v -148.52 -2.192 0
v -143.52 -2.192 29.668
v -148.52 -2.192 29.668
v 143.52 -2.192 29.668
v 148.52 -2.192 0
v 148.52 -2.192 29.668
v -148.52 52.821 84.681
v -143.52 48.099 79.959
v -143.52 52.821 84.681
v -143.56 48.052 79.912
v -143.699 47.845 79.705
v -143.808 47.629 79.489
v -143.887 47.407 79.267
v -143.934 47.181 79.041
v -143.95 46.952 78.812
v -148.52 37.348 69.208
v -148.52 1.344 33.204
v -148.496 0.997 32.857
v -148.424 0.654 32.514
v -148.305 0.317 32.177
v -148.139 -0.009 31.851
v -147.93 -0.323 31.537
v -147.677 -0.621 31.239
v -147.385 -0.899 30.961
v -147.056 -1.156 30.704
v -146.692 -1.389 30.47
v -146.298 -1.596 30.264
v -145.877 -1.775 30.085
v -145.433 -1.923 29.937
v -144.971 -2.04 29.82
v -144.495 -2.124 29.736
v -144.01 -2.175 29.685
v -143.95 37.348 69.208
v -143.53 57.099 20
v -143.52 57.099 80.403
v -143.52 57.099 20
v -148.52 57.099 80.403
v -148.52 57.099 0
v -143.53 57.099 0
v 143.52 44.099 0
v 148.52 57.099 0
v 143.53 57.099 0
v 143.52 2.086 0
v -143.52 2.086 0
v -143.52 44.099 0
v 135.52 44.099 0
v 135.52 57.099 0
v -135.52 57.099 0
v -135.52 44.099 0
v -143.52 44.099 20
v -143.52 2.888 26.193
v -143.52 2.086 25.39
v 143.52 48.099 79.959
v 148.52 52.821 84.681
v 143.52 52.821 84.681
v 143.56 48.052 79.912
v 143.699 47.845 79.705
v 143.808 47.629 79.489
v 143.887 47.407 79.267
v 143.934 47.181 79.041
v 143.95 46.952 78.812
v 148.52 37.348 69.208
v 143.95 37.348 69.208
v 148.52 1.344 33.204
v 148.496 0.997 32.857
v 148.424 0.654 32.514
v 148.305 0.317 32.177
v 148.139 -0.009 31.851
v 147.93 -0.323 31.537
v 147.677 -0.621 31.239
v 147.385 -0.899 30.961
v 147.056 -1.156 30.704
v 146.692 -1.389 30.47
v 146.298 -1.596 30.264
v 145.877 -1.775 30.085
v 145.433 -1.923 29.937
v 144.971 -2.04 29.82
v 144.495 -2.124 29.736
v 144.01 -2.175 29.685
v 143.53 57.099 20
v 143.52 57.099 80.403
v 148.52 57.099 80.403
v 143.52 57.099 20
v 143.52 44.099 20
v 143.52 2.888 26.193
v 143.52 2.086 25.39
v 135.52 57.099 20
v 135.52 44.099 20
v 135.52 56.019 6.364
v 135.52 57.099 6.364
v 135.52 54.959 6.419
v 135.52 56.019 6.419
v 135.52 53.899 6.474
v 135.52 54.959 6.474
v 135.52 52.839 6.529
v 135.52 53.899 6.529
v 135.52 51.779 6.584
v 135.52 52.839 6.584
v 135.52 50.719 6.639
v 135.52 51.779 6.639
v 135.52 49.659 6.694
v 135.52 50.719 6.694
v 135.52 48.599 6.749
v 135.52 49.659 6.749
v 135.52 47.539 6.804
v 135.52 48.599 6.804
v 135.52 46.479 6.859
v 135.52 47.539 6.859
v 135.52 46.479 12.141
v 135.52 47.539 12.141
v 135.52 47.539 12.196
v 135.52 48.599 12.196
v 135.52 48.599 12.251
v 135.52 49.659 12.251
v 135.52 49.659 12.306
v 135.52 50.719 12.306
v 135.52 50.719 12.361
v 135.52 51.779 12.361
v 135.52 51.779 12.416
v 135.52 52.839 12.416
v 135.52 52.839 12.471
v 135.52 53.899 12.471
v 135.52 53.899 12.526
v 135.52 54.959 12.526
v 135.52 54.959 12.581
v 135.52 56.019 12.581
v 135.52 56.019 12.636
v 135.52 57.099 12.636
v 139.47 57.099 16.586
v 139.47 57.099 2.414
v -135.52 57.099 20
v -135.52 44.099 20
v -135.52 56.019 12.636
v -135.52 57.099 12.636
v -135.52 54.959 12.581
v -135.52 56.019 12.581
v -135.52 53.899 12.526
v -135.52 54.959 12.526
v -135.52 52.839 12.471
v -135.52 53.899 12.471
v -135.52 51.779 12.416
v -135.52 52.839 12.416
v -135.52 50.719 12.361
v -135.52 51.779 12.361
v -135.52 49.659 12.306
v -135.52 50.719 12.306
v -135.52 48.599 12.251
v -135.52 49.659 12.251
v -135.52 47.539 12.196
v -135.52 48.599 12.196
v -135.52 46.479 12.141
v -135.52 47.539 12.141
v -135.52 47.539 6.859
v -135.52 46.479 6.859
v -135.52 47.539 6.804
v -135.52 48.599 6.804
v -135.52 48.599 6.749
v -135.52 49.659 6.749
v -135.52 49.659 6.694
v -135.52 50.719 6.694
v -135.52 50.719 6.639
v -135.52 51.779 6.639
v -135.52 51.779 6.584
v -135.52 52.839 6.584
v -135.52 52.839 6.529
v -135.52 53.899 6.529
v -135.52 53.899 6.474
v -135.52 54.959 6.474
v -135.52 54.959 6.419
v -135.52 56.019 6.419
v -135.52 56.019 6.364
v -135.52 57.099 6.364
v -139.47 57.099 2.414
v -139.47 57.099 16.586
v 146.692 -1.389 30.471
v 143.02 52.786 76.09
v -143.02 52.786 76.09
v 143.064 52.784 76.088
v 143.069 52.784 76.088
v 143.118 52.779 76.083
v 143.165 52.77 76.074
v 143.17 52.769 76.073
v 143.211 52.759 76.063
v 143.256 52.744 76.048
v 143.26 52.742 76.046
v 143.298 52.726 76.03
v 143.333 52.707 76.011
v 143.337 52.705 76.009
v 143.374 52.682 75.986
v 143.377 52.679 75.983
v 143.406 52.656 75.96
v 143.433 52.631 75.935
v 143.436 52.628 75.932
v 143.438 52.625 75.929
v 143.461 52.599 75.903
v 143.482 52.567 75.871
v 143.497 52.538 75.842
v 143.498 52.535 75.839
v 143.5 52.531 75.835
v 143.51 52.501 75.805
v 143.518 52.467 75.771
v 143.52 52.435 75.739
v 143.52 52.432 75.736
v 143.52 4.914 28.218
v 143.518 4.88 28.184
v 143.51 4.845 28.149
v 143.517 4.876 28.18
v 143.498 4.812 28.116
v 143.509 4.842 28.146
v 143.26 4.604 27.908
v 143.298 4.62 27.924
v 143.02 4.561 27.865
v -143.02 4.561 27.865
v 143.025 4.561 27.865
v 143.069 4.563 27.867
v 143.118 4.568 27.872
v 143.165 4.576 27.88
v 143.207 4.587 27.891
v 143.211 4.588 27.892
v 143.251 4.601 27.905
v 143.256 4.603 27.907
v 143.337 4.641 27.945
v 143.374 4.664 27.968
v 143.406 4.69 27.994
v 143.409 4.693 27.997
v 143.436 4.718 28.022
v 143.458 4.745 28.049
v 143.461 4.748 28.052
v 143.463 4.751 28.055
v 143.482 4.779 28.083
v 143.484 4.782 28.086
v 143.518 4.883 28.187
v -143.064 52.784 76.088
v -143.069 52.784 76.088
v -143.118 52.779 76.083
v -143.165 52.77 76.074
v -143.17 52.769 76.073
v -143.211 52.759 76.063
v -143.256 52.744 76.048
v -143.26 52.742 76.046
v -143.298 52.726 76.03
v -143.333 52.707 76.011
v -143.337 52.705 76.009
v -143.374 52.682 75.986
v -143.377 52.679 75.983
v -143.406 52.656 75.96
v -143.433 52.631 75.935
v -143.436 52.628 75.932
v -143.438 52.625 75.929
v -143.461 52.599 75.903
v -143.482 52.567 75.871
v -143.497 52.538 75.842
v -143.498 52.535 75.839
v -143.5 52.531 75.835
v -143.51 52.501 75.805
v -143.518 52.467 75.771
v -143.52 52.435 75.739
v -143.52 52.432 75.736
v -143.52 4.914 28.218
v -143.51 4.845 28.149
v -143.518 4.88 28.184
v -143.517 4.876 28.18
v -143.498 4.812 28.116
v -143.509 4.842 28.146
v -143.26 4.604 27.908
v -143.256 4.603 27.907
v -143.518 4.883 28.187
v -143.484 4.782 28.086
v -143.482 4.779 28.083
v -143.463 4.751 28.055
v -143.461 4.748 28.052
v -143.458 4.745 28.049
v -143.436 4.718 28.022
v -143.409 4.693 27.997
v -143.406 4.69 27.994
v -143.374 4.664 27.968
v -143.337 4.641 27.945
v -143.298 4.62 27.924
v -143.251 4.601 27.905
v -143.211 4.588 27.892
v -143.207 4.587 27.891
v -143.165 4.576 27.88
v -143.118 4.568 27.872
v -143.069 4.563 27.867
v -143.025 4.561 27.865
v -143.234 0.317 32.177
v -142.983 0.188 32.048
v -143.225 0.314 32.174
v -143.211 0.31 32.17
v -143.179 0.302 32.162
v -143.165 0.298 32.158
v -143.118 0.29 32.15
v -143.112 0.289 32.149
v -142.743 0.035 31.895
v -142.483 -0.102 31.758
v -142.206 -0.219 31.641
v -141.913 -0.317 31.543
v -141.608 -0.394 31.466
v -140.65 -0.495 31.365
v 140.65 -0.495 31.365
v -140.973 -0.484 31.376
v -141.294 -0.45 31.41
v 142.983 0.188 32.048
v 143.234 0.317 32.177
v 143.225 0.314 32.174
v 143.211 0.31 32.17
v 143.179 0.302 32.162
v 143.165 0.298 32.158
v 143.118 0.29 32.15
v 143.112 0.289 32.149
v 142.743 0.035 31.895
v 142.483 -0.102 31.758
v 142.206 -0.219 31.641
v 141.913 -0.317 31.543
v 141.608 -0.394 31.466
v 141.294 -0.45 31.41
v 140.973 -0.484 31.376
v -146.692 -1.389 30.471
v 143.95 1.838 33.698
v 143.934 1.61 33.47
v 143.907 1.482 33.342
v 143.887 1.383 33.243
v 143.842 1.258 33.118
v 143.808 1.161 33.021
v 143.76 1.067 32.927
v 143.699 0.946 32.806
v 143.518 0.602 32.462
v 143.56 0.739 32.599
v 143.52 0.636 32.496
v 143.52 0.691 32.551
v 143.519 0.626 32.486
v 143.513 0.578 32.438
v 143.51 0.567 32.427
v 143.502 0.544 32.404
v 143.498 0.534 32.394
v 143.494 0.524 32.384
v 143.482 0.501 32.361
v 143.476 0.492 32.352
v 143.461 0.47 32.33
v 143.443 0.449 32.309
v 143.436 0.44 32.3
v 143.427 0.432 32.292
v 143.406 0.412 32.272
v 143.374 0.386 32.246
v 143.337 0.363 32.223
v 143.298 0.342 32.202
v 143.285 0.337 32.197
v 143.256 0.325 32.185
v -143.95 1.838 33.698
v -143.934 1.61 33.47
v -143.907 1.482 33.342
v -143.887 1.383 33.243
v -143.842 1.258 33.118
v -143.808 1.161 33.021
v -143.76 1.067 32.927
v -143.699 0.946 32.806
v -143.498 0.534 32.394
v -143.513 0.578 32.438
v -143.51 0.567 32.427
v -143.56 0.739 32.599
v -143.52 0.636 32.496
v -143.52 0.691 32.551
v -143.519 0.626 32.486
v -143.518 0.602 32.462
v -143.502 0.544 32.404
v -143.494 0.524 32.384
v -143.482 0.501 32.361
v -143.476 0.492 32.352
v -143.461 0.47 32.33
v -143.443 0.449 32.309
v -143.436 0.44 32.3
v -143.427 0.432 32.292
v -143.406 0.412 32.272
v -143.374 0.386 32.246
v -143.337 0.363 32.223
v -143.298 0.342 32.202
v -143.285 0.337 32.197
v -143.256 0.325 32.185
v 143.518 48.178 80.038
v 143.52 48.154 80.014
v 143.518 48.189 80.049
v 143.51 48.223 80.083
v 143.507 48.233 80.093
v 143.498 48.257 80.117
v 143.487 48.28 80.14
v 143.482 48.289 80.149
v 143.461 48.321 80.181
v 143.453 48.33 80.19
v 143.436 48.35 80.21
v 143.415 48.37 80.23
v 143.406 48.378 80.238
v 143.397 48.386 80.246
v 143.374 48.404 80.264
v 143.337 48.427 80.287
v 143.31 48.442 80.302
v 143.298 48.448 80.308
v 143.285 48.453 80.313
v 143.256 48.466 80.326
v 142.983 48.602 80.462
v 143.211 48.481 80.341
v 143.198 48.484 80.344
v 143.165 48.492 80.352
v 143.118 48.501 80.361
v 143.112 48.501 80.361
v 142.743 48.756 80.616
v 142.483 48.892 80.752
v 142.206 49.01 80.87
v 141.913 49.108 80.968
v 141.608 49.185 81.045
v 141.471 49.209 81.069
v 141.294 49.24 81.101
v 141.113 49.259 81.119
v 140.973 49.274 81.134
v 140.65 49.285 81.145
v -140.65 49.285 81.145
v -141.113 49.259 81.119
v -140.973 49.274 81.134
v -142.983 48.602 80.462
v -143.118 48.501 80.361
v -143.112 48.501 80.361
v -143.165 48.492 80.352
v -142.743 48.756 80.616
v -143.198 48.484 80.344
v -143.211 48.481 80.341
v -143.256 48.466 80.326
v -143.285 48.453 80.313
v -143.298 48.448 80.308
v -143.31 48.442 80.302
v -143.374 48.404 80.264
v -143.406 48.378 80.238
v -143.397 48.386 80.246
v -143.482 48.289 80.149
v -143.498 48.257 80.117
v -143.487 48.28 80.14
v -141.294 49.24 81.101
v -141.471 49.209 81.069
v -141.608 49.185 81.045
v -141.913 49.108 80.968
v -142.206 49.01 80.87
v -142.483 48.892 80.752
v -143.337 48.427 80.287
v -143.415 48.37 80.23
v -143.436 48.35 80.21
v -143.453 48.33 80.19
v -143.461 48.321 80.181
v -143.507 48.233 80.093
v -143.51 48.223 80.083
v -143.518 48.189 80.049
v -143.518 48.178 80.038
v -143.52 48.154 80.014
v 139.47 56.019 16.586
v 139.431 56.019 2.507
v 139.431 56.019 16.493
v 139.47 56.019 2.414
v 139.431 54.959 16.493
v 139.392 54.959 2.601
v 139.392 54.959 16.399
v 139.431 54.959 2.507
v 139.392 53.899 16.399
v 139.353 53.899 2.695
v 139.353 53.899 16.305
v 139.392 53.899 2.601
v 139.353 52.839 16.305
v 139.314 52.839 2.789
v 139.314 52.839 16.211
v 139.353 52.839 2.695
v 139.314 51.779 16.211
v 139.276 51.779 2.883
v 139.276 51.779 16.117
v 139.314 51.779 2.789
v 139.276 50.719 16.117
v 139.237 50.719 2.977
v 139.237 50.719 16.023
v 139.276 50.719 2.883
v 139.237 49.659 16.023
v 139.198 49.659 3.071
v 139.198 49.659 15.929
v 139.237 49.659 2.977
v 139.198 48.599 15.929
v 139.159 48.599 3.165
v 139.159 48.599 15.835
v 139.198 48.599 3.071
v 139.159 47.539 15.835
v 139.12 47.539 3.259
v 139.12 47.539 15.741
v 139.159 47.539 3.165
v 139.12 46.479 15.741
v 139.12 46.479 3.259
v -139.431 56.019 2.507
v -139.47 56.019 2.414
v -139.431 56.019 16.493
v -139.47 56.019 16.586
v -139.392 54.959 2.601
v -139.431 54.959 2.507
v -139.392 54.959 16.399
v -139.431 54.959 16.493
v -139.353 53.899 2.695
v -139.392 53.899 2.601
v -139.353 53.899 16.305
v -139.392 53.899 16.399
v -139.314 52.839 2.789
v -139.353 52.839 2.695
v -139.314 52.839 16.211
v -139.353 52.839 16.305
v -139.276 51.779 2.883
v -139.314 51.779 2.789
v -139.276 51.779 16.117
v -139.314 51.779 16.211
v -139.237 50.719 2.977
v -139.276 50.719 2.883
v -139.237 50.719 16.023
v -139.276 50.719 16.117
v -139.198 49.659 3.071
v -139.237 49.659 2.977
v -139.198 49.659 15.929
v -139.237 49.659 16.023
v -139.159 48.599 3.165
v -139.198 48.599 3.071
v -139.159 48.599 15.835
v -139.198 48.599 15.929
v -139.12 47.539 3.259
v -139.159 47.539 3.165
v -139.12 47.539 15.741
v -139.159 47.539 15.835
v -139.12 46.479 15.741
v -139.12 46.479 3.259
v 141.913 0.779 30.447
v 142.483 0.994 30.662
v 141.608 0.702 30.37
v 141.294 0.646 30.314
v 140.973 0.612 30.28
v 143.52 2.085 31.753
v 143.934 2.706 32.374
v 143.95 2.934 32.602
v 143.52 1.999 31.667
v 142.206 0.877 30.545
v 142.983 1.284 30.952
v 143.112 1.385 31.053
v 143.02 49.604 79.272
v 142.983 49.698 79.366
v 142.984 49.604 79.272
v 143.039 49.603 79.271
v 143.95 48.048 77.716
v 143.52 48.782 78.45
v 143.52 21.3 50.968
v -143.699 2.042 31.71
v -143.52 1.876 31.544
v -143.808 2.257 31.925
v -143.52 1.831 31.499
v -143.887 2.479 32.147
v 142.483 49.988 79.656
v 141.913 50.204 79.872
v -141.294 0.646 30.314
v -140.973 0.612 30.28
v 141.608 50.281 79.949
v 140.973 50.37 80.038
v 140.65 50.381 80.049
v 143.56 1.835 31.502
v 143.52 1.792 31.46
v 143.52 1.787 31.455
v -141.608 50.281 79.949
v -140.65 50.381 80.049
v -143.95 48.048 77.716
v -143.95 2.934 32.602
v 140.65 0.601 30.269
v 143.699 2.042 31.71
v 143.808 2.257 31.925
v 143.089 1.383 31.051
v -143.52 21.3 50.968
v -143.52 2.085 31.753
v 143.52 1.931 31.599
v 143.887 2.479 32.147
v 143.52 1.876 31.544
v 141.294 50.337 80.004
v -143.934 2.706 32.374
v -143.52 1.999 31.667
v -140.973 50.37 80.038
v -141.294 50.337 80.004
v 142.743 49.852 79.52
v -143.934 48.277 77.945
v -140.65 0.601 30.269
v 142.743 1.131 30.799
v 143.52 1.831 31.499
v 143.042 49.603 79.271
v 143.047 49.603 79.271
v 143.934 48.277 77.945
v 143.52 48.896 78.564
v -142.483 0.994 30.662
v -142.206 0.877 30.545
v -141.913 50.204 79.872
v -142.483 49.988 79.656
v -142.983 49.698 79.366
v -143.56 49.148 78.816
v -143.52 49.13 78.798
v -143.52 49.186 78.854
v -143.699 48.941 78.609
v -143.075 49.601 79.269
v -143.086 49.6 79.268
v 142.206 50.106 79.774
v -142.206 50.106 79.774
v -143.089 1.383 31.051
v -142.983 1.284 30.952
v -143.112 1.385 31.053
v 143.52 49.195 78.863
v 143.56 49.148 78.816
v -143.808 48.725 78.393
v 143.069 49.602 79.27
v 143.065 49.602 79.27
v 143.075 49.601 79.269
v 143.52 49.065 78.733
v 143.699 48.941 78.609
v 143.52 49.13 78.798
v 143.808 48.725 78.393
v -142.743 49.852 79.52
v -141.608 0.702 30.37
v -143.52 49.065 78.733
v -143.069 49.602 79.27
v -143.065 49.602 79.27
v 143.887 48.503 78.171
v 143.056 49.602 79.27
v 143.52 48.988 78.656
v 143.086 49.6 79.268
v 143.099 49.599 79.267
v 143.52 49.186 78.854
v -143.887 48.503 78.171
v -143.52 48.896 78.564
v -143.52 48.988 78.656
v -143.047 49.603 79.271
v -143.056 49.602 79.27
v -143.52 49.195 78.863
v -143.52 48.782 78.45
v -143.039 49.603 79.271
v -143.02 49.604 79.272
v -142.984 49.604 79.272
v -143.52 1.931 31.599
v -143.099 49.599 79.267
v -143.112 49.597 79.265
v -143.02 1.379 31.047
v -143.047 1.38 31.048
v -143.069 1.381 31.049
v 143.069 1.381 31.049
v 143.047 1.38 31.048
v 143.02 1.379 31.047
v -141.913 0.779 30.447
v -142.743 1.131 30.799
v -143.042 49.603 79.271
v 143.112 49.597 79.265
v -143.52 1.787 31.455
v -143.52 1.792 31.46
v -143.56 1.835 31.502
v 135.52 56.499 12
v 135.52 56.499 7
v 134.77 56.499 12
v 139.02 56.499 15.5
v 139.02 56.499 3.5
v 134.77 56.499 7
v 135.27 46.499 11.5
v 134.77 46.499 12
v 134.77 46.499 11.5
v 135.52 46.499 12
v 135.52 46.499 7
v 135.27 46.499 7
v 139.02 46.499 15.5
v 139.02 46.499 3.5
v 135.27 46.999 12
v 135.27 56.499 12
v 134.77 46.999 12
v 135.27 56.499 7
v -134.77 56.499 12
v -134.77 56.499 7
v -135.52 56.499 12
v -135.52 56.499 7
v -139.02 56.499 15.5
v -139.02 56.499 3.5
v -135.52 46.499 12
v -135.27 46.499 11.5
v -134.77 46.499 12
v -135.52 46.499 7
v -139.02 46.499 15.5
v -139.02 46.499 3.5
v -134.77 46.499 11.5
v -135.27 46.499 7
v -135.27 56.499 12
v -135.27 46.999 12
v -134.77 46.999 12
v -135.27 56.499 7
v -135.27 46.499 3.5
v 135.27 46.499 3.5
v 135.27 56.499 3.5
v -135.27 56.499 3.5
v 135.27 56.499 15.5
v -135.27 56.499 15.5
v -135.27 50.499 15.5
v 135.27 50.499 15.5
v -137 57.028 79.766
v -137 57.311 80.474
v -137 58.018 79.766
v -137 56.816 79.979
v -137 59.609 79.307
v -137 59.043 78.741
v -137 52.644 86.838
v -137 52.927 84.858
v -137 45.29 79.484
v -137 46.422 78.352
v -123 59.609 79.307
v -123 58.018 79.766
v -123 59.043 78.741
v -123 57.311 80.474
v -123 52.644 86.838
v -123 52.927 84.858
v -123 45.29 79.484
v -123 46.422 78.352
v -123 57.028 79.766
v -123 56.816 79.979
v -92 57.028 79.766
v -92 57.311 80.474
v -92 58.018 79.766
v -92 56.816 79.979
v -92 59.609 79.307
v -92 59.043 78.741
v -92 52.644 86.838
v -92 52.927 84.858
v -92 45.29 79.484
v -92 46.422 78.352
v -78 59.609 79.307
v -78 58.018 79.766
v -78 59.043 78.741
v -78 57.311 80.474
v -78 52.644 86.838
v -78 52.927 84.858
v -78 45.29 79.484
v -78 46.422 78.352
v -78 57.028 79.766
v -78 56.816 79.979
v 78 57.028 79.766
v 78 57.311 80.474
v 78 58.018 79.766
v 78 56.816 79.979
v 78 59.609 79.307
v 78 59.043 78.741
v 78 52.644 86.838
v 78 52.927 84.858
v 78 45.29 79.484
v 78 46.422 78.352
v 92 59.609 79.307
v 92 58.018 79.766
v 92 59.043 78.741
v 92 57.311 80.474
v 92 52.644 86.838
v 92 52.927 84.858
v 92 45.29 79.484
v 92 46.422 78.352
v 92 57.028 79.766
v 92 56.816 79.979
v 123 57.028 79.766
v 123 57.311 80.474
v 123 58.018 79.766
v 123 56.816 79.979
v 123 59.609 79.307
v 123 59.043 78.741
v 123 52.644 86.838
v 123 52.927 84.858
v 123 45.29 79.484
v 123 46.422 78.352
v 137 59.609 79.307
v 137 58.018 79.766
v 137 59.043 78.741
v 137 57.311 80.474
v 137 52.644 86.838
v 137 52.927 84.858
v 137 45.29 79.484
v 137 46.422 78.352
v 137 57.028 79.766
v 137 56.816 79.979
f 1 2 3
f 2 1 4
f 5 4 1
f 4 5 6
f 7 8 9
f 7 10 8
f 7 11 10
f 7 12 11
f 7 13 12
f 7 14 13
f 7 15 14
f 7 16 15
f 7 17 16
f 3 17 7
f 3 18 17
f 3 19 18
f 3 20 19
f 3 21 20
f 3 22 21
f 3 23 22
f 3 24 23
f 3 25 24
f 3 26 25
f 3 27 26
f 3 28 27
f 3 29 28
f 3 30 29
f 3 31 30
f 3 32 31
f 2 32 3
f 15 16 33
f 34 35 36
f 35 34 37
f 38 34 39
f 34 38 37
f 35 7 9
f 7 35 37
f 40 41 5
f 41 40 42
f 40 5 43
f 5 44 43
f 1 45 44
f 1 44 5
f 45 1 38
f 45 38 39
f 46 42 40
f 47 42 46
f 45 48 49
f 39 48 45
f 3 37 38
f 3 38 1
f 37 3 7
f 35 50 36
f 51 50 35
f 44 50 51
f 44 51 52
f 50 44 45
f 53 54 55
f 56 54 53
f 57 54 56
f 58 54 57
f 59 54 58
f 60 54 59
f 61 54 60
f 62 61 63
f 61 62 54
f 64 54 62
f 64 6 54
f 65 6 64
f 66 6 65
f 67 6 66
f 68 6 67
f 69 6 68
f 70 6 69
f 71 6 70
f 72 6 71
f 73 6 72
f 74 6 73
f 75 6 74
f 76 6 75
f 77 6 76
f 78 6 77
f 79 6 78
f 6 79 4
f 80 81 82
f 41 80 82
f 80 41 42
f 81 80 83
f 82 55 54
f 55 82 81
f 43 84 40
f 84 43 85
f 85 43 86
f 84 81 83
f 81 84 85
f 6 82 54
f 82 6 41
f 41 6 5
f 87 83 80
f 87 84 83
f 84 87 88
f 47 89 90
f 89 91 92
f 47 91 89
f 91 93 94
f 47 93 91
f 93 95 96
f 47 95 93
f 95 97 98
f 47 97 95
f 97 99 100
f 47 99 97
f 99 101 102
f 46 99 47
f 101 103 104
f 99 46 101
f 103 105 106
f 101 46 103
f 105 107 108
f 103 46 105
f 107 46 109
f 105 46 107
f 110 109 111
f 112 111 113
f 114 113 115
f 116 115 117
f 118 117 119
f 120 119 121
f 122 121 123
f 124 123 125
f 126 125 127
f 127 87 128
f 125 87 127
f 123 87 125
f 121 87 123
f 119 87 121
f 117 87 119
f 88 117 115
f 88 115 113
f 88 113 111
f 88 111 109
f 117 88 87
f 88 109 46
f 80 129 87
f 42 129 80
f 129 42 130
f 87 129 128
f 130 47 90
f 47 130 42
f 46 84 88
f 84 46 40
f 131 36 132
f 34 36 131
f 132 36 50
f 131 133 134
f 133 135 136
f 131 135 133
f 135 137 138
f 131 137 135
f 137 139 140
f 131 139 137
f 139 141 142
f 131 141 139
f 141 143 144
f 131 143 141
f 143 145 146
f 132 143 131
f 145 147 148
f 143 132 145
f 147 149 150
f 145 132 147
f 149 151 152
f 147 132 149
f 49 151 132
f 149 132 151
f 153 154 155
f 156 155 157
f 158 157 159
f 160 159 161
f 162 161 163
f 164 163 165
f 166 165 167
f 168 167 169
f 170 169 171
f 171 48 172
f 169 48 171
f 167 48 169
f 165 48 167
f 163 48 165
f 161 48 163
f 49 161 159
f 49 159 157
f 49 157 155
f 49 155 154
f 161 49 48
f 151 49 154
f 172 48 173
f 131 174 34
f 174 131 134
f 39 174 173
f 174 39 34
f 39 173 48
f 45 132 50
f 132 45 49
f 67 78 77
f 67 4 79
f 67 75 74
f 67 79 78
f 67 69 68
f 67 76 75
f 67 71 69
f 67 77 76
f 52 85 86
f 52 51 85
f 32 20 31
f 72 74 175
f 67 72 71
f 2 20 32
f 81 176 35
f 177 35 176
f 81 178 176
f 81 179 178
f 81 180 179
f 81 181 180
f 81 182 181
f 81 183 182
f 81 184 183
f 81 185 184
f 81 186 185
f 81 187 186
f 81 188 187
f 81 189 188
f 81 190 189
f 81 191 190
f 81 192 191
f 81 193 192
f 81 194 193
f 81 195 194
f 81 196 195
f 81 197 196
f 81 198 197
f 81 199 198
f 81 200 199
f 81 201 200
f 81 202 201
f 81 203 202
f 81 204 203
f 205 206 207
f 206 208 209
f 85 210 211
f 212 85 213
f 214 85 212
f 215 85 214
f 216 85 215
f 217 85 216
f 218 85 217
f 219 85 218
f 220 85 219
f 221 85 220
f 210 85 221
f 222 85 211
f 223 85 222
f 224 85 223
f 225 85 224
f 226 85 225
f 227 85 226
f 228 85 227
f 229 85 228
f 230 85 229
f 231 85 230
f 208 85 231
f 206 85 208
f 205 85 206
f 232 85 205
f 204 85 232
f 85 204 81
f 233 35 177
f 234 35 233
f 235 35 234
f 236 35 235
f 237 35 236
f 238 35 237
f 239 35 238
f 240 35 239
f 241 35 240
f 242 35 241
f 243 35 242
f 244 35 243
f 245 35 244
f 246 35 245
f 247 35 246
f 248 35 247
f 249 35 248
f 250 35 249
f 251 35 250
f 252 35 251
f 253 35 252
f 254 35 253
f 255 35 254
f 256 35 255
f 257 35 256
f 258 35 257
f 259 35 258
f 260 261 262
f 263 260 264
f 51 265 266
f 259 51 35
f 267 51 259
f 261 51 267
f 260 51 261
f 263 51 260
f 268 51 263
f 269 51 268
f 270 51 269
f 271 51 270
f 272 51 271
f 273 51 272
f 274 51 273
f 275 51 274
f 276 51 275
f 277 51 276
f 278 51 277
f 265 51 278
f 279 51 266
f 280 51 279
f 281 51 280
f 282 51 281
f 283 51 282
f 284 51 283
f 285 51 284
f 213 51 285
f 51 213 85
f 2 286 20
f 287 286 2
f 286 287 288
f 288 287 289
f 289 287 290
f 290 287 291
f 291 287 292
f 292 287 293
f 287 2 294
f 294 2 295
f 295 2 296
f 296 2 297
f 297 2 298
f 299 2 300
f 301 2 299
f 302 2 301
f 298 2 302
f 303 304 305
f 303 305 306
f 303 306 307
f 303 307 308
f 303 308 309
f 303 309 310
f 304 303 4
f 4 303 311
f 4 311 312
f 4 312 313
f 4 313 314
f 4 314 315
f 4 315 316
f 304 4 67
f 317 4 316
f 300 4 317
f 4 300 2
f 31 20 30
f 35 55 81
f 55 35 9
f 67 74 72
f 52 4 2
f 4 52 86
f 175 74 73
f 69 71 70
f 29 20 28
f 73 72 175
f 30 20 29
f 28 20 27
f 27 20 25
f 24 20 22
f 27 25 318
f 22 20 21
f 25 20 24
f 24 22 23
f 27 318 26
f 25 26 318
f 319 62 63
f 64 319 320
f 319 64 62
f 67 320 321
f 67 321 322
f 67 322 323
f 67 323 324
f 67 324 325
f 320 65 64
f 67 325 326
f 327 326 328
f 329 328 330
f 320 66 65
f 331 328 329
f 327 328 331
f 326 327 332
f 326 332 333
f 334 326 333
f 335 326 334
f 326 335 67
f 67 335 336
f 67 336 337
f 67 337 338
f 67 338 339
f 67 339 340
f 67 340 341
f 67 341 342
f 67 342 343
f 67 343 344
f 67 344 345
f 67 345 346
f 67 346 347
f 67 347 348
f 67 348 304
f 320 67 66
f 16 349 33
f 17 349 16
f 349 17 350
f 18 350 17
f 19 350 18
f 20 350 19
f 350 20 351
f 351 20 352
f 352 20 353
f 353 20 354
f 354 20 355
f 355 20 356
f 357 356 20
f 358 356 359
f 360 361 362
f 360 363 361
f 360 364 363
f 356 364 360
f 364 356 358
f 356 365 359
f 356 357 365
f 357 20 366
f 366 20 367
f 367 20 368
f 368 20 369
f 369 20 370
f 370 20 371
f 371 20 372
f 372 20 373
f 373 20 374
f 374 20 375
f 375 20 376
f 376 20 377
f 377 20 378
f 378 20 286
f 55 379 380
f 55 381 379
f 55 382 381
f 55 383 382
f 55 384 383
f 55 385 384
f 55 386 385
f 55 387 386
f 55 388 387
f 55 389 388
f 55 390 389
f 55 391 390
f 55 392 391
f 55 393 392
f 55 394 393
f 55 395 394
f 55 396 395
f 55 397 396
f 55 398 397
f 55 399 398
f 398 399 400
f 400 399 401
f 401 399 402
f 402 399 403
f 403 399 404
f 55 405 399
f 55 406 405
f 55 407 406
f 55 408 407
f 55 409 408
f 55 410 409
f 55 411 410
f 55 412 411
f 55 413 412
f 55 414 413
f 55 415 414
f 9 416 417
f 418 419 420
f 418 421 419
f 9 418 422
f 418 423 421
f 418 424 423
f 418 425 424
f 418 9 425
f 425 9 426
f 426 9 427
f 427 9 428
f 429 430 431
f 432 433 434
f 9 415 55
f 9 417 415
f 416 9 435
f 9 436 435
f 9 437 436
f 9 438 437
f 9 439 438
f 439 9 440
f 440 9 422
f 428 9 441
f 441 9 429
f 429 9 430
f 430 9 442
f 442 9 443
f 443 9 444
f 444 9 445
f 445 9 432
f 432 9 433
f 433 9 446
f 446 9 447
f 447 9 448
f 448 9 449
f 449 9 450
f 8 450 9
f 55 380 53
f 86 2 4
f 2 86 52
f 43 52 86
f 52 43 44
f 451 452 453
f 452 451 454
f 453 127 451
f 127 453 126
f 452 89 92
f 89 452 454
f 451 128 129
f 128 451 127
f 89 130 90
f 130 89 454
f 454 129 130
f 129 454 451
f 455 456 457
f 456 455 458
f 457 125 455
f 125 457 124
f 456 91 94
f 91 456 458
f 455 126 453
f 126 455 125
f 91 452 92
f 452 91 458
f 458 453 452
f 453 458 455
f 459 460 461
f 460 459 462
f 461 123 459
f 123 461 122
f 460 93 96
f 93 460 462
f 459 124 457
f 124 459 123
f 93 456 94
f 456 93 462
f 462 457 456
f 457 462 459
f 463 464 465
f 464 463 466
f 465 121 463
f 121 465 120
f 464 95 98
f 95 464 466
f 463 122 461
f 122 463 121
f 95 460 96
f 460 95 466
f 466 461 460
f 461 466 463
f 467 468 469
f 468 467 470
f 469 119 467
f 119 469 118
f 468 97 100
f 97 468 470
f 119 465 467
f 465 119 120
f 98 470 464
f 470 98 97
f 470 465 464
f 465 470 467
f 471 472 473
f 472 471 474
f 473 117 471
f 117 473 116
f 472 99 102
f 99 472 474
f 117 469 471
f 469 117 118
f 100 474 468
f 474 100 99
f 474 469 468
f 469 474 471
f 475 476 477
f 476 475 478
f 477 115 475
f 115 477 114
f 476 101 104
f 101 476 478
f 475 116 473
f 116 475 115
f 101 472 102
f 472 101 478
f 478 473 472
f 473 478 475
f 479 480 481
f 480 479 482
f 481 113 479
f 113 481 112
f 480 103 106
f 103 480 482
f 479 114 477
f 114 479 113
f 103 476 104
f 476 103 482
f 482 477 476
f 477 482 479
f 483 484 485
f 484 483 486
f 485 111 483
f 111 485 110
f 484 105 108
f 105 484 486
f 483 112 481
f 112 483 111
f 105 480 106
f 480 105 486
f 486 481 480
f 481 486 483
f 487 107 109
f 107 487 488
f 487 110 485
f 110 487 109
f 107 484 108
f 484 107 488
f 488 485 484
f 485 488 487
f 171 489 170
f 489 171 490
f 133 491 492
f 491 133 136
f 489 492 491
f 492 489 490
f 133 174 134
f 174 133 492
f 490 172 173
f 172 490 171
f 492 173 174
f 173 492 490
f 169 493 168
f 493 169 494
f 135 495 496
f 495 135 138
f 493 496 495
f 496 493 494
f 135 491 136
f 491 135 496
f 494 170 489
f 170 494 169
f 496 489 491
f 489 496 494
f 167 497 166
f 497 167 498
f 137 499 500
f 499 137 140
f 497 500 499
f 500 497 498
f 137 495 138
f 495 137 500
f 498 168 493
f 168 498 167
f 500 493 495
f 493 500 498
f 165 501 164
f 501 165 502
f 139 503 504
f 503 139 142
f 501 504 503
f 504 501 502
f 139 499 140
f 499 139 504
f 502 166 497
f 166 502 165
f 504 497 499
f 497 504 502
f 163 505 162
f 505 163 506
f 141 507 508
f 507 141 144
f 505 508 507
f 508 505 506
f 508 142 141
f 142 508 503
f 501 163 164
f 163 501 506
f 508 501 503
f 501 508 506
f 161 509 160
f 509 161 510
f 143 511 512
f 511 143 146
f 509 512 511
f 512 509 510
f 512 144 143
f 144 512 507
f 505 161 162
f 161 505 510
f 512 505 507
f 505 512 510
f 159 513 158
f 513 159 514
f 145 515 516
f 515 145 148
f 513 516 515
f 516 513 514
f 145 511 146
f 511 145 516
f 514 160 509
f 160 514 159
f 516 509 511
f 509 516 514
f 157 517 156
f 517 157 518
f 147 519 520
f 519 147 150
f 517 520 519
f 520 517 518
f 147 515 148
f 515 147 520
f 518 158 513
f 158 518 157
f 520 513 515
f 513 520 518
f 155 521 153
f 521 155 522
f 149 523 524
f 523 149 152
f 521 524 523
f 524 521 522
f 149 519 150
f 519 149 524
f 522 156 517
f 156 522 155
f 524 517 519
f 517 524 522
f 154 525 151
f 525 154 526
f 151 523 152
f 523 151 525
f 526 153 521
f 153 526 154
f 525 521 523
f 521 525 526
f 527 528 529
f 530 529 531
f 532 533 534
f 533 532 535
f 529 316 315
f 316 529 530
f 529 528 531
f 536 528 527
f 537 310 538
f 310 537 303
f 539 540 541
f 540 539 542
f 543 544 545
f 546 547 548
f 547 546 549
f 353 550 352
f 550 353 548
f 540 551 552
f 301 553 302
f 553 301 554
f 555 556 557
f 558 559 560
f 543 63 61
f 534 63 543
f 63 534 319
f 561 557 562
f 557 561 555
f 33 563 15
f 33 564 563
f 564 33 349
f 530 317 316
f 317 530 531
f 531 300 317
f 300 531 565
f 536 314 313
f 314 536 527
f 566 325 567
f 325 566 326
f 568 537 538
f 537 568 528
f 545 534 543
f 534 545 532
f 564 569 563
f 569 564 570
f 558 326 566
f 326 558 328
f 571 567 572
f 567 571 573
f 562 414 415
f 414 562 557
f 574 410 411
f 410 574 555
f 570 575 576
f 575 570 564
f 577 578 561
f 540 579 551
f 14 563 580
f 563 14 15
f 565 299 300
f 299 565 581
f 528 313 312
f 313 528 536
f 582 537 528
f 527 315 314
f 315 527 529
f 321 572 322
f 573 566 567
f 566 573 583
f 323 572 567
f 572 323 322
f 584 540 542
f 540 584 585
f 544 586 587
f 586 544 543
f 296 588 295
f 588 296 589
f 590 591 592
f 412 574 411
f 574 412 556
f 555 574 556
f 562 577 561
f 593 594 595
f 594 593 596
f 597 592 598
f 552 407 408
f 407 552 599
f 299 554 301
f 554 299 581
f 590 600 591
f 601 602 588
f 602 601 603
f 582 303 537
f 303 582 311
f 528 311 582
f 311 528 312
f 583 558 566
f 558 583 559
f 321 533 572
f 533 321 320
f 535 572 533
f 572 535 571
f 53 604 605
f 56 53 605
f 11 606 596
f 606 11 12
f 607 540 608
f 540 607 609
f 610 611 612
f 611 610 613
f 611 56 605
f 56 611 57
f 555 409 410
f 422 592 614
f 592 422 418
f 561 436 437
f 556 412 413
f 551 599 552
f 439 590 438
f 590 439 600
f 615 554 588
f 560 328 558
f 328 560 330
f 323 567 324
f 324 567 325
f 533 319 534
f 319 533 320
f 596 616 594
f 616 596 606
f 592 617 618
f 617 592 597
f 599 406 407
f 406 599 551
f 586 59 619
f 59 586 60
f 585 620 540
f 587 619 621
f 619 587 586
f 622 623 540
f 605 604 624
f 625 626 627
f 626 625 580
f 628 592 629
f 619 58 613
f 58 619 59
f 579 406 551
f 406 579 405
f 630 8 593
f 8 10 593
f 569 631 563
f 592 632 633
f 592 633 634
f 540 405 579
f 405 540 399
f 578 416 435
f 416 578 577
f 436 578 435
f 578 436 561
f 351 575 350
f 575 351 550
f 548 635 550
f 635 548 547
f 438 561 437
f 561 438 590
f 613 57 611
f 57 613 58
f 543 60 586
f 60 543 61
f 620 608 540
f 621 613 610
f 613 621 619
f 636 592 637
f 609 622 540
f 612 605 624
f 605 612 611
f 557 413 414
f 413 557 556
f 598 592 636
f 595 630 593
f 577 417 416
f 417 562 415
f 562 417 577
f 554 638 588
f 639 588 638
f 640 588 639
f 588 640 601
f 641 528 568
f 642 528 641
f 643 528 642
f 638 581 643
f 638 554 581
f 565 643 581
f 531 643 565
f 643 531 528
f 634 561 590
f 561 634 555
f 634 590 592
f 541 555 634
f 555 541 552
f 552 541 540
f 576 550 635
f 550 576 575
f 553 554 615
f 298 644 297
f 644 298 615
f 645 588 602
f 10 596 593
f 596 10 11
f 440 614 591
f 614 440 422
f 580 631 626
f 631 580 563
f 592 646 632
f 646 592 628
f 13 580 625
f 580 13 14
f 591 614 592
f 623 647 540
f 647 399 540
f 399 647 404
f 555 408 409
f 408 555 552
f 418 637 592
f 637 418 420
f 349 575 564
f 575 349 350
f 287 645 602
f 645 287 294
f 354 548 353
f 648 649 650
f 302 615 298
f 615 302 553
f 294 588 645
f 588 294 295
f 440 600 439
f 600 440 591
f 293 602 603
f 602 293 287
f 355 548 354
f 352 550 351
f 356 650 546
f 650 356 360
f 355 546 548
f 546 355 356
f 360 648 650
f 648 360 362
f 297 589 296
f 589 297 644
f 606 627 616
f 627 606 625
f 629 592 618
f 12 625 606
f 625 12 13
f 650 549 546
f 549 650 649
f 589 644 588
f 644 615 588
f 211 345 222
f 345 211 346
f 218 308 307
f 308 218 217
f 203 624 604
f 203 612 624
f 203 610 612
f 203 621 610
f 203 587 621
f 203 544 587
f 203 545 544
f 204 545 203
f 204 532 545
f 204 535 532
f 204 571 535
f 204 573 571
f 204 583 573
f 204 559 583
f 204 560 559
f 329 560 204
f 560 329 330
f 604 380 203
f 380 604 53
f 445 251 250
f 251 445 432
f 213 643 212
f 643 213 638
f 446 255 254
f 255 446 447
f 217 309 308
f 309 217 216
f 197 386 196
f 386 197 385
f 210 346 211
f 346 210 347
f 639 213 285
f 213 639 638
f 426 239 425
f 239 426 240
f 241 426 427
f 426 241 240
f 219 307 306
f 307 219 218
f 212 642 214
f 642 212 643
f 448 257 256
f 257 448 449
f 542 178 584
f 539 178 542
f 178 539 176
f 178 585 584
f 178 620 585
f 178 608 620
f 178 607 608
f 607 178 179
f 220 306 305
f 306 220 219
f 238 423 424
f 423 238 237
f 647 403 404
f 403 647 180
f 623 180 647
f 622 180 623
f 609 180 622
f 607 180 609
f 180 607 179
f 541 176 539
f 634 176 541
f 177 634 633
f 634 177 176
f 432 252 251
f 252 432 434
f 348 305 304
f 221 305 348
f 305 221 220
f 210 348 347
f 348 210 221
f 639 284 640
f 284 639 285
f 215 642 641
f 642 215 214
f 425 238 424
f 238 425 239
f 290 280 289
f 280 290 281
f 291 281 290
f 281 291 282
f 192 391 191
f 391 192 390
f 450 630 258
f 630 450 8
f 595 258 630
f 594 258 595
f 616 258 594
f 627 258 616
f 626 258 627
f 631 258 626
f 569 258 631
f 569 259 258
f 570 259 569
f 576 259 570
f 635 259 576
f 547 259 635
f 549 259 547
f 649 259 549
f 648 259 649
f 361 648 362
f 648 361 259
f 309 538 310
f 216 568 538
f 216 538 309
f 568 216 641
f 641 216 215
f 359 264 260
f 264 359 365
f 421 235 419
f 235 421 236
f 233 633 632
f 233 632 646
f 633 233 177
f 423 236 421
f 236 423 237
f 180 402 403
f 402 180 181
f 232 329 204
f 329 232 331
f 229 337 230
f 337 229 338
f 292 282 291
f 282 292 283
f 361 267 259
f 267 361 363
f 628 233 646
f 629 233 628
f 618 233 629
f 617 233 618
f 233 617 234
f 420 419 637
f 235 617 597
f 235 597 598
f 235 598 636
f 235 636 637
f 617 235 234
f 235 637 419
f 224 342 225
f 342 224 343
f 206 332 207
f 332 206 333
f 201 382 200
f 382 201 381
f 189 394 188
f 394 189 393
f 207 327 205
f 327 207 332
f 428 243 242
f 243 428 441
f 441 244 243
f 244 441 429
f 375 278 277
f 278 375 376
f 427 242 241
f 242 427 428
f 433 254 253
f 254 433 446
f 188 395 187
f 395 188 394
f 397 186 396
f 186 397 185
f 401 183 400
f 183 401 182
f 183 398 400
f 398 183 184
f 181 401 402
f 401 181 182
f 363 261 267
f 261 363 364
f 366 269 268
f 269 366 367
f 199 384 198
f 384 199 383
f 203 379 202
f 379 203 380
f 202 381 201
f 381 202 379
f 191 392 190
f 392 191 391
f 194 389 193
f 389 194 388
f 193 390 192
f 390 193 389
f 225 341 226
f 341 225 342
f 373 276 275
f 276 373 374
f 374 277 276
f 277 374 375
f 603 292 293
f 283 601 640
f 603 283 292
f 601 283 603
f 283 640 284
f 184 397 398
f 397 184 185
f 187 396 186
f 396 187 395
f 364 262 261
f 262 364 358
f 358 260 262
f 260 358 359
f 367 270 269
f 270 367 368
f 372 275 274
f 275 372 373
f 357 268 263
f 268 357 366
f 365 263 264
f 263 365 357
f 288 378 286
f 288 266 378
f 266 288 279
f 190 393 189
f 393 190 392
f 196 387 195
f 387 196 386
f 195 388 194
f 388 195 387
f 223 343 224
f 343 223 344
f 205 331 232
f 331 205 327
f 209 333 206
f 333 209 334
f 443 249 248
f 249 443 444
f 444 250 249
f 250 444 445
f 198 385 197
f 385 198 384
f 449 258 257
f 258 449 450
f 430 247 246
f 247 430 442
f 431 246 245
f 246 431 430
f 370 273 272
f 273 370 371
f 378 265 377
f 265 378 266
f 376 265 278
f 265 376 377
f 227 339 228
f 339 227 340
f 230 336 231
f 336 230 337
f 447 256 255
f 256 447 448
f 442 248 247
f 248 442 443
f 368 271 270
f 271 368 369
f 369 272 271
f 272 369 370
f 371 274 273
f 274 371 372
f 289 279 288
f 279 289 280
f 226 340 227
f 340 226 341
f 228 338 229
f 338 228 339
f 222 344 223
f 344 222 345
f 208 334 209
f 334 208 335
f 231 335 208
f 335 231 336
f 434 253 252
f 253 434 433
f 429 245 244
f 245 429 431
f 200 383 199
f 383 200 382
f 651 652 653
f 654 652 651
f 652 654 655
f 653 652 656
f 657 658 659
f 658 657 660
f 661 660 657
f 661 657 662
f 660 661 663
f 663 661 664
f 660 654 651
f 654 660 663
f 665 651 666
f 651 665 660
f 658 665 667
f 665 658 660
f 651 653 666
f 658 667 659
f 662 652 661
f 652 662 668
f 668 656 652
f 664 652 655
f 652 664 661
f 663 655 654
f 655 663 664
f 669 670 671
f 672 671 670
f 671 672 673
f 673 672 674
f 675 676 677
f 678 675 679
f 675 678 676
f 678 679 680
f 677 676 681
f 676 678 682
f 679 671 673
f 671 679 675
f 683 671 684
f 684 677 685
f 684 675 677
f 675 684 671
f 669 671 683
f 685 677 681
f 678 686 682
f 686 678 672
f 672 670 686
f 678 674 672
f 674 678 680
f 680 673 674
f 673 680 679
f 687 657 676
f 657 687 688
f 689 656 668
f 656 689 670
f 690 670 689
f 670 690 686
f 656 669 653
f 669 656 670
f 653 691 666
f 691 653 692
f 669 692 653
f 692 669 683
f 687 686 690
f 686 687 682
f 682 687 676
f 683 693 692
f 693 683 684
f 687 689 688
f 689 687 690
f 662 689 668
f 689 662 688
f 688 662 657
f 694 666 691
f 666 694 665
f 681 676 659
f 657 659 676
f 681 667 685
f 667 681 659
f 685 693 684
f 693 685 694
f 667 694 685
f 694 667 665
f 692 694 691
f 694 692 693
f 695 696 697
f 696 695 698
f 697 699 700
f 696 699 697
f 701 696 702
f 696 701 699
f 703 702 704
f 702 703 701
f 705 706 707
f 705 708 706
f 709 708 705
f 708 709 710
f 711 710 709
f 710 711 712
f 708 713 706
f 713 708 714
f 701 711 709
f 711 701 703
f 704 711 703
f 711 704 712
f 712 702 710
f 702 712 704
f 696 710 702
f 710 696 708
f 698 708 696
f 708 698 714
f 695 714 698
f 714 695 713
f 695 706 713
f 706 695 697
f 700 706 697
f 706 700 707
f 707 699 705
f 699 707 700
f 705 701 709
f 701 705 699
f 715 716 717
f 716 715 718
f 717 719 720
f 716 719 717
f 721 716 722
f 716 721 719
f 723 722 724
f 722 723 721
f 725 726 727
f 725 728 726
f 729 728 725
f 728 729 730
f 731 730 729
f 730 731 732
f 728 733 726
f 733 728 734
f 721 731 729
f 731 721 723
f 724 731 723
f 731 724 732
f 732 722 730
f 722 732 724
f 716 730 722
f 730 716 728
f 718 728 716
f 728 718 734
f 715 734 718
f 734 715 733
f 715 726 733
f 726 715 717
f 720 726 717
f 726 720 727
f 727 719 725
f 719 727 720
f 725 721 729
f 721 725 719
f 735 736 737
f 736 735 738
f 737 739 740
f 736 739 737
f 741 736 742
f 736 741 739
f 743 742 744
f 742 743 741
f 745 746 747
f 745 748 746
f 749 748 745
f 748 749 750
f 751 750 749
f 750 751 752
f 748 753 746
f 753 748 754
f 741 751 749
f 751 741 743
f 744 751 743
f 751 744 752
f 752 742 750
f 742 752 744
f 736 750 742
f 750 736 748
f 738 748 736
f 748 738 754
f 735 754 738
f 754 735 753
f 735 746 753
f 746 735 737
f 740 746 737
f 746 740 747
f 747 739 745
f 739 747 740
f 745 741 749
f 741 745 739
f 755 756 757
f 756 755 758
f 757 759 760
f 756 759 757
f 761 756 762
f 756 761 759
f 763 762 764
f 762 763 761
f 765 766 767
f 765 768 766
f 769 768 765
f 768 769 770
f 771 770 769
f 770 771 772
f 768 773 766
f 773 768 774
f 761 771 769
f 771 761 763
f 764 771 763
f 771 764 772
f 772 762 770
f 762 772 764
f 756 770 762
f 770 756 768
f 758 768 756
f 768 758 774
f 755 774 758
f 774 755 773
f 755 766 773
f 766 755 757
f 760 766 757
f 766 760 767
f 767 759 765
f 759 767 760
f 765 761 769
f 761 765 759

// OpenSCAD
// =====================================================================
// Desk-HUD 3D-printed stand  (Waveshare 11.9" HDMI LCD, 1480x320)
//
// Parametric OpenSCAD source for every printable part:
//   stand   one-piece 45 degree stand (the main part)
//   bar     separate rear tie bar, slides into dovetail sockets
//   clips   4 snap-on retaining clips for the top edge of the screen
// plus export helpers (lens-down print orientation, fit-test pieces)
// and interference checks. See doc/install_stand.md.
//
// Build:   make            (exports ../stl/*.stl and runs the checks)
// Or pick a part by hand:  openscad -D 'PART="stand"' -o stand.stl desk-hud-stand.scad
//
// Concept: a tilted plate with
//   * a through-window sized for the panel's inner lip / LCD module
//     (so the module, PCB and the Pi hang through the plate, open back)
//   * a thin ledge that carries the underside of the glass lens
//   * a continuous ridge around the lens outer edge
// ...held up by two triangular end cheeks and a front apron, tied
// together at the back by a separate dovetailed bar.
//
// Panel dimensions come from the Waveshare STEP model + 2D drawing
// (not redistributed here). The numbers you are most likely to tune
// are in the PARAMETERS block -- especially pi_depth.
// Coordinates: panel frame u = along the long edge, v = up the screen
// from the lens bottom edge, w = out of the lens face (0 = lens front).
// =====================================================================

$fn = 64;

// ---------------------- PARAMETERS -----------------------------------

tilt = 45;            // screen tilt from vertical (45 = half-way back)

// --- panel (from STEP; w = 0 at the lens front face, negative = behind)
lens_w   = 287.3;     // glass outer width
lens_h   = 69.8;      // glass outer height
lens_t   = 1.12;      // glass thickness (underside at w = -lens_t)
lens_r   = 3.0;       // glass corner radius (drawing: 4 x R3)
lip_w    = 285.8;     // layer under the glass ("inner lip")
lip_h    = 67.6;
lip_u_max = 143.22;   // widest extent of that layer from centre in the STEP
mod_w    = 282.0;     // LCD module behind the lip
mod_h    = 65.0;
// PCB + connectors envelope (worst case, used for clearance only)
pcb_u0   = -63.5;  pcb_u1 = 58.5;     // along the long axis
pcb_v0   = 1.67;   pcb_v1 = lens_h - 1.67;
pcb_w0   = -15.95; pcb_w1 = -7.02;    // deepest connector -> PCB face

// --- fit clearances
pk_clr   = 0.30;      // glass pocket clearance, per side
win_clr  = 0.30;      // window clearance around the lip, per side
win_r    = 0.5;       // window corner radius (lip layer corners are square)
ledge_gap= 0.03;      // ledge sits this far below the glass underside

// --- stand geometry
plate_t  = 4.5;       // thickness of the plate under the ledge
ridge_w  = 2.4;       // ridge thickness along the bottom edge
ridge_top_w = 5.0;    // wider along the TOP edge: it spans the full length
                      // unsupported, so it is made stiffer
ridge_up = 0.4;       // ridge stands this far proud of the lens face
cheek_t  = 5.0;       // end cheek thickness (sets overall length)
apron_on = true;      // front wall joining the cheeks

// --- rear tie bar: a SEPARATE piece that slides into a dovetail socket
//     in a boss on the inside of each cheek (inserted from the rear)
bosses_on = true;     // false = no sockets (print without the bar)
bar_d    = 10;        // bar depth, front to back (y)
bar_h    = 12;        // bar height (z)
dt_neck  = 5;         // dovetail neck width (z)
dt_depth = 3.5;       // dovetail depth (x); 45 deg flanks -> no supports
dt_zc    = 9.5;       // height of the dovetail centre above the desk
dt_clr_rear  = 0.45;  // socket clearance at the rear opening (easy start)
dt_clr_front = 0.10;  // socket clearance at the front stop (wedges snug)
bar_gap  = 0.25;      // gap between bar end and boss face
bar_chamfer = 4;      // 45 deg chamfer on the bar's top-front edge: keeps it
                      // clear of the Pi stack hanging behind the screen
boss_w   = 8;         // boss thickness, inward from the cheek (x)
boss_h   = 20;
boss_d   = 13;        // boss depth, front to back (y)
desk_clear = 5;       // min. gap between lowest PCB/connector and desk

// --- Raspberry Pi 5 + cooler mounted on the back of the display.
//     MEASURE pi_depth: lay the display lens-down on a table and measure
//     the height of the highest part of the Pi / cooler above the table.
pi_depth = 44;        // reach of the Pi stack behind the LENS FRONT (mm)
pi_v0    = 5.4;       // height of the Pi's bottom edge above the lens's bottom edge
pi_clear = 4;         // clearance between the Pi stack and the table
extra_lift = 0;       // any additional lift on top of the computed height

// ---------------------- DERIVED ---------------------------------------

s = sin(tilt);
c = cos(tilt);

// glass pocket + window, in panel coordinates (u = along length, v = up
// the screen from the lens bottom edge, w = out of the lens face)
pk_w   = lens_w + 2*pk_clr;
pk_v0  = -pk_clr;
pk_v1  = lens_h + pk_clr;
op_w   = 2*(lip_u_max + win_clr);   // window width (lip is slightly
                                    // off-centre in the STEP, use its max)
op_h   = lip_h + 2*win_clr;
op_v0  = (lens_h - op_h)/2;
op_v1  = op_v0 + op_h;

w_top  = ridge_up;                   // ridge top
w_led  = -lens_t - ledge_gap;        // ledge (glass rests here)
w_bot  = w_led - plate_t;            // plate underside

v_lo   = pk_v0 - ridge_w;            // plate edges along v
v_hi   = pk_v1 + ridge_top_w;
cheek_out = op_w/2 + cheek_t;        // half overall length

dt_wide    = dt_neck + 2*dt_depth;   // 45 deg flanks
x_c        = op_w/2;                 // cheek inner face
x_b        = x_c - boss_w;           // boss inner face (faces the centre)
groove_len = bar_d + 0.6;

// height of panel origin above the desk: lowest connector clears desk
z0 = max(desk_clear - (pcb_v0*c + pcb_w0*s),
         3 - (v_lo*c + w_bot*s),
         pi_clear - (pi_v0*c - pi_depth*s)) + extra_lift;
y0 = 0;

function tf(u,v,w) = [u, y0 + v*s - w*c, z0 + v*c + w*s];

// panel frame -> world
module placed() {
    multmatrix([[1,0,0,0],
                [0,s,-c,y0],
                [0,c, s,z0],
                [0,0,0,1]]) children();
}

module rrect(w, h, r) {
    offset(r = r) square([w - 2*r, h - 2*r], center = true);
}

// ---------------------- PANEL-FRAME SOLIDS ----------------------------

module plate_body() {
    translate([0, 0, w_bot])
        linear_extrude(height = w_top - w_bot)
            translate([0, (v_lo + v_hi)/2])
                rrect(2*cheek_out, v_hi - v_lo, 5);
}

module pocket_void() {
    translate([0, 0, w_led])
        linear_extrude(height = w_top - w_led + 2)
            translate([0, (pk_v0 + pk_v1)/2])
                rrect(pk_w, pk_v1 - pk_v0, lens_r + pk_clr);
}

module window_void() {
    translate([0, 0, w_bot - 1])
        linear_extrude(height = w_top - w_bot + 4)
            translate([0, (op_v0 + op_v1)/2])
                rrect(op_w, op_h, win_r);
}

// ---------------------- WORLD-FRAME SUPPORT ---------------------------

A = tf(0, v_lo, w_top);   // front-top corner of plate
B = tf(0, v_lo, w_bot);   // front-bottom corner
C = tf(0, v_hi, w_bot);   // rear-bottom corner
D = tf(0, v_hi, w_top);   // rear-top corner

// side profile polygon is in (y, z); extrude along x
module profile_prism(x0, x1, pts) {
    translate([x0, 0, 0])
        rotate([90, 0, 90])
            linear_extrude(height = x1 - x0)
                polygon(pts);
}

module cheeks() {
    pts = [[A[1], 0], [C[1], 0], [C[1], C[2]], [D[1], D[2]], [A[1], A[2]]];
    profile_prism(-cheek_out, -op_w/2, pts);
    profile_prism( op_w/2,  cheek_out, pts);
}

module apron() {
    pts = [[A[1], 0], [B[1], 0], [B[1], B[2]], [A[1], A[2]]];
    profile_prism(-cheek_out, cheek_out, pts);
}

// y of the cheek rear face / bar front stop (set after C is known)
y_rear = C[1];
y_f    = y_rear - groove_len;

function dt_poly() = [
    [x_b - 1,        dt_zc - dt_neck/2],
    [x_b,            dt_zc - dt_neck/2],
    [x_b + dt_depth, dt_zc - dt_wide/2],
    [x_b + dt_depth, dt_zc + dt_wide/2],
    [x_b,            dt_zc + dt_neck/2],
    [x_b - 1,        dt_zc + dt_neck/2]
];

module bosses() {
    for (m = [0, 1]) mirror([m, 0, 0])
        translate([x_b, y_rear - boss_d, 0])
            cube([boss_w + 0.01, boss_d, boss_h]);
}

// tapered dovetail socket: open at the rear, closed (stop) at the front
module socket() {
    N = 10; sl = groove_len / N;
    for (m = [0, 1]) mirror([m, 0, 0])
        for (i = [0 : N - 1]) {
            c = dt_clr_rear + (dt_clr_front - dt_clr_rear) * i / (N - 1);
            translate([0, y_rear - i*sl + (i == 0 ? 1 : 0), 0])
                rotate([90, 0, 0])
                    linear_extrude(height = sl + 0.02 + (i == 0 ? 1 : 0))
                        offset(delta = c) polygon(dt_poly());
        }
}

// the separate rear tie bar (assembled position)
module bar() {
    hl = x_b - bar_gap;
    zlo = dt_zc - bar_h/2; zhi = dt_zc + bar_h/2;
    translate([-hl, 0, 0]) rotate([90, 0, 90])
        linear_extrude(height = 2*hl)
            polygon([[y_f, zlo], [y_f + bar_d, zlo], [y_f + bar_d, zhi],
                     [y_f + bar_chamfer, zhi], [y_f, zhi - bar_chamfer]]);
    for (m = [0, 1]) mirror([m, 0, 0])
        translate([0, y_f + bar_d, 0]) rotate([90, 0, 0])
            linear_extrude(height = bar_d)
                polygon([[hl - 0.5,        dt_zc - dt_neck/2],
                         [x_b,             dt_zc - dt_neck/2],
                         [x_b + dt_depth,  dt_zc - dt_wide/2],
                         [x_b + dt_depth,  dt_zc + dt_wide/2],
                         [x_b,             dt_zc + dt_neck/2],
                         [hl - 0.5,        dt_zc + dt_neck/2]]);
}

// bar laid on its rear face for printing: dovetails run vertically,
// so there are no overhangs at all
module bar_for_print() {
    translate([0, 0, -y_f]) rotate([90, 0, 0]) bar();
}

// ---------------------- THE STAND -------------------------------------

module stand() {
    difference() {
        union() {
            placed() plate_body();
            cheeks();
            if (apron_on) apron();
            if (bosses_on) bosses();
        }
        placed() pocket_void();
        placed() window_void();
        if (bosses_on) socket();
    }
}

// ---------------------- REFERENCE PANEL MODEL -------------------------
// Simplified stack built from STEP measurements, used only for
// collision checks / preview. Not exported.

module panel_model(with_pcb = true) {
    placed() {
        // lens
        translate([0, lens_h/2, -lens_t])
            linear_extrude(height = lens_t) rrect(lens_w, lens_h, lens_r);
        // lip layer
        translate([-lip_w/2, (lens_h - lip_h)/2, -2.02]) cube([lip_w, lip_h, 2.02 - lens_t]);
        // LCD module
        translate([-mod_w/2, (lens_h - mod_h)/2, -10.77]) cube([mod_w, mod_h, 10.77 - 2.02]);
        // PCB + connector envelope
        if (with_pcb)
            translate([pcb_u0, pcb_v0, pcb_w0])
                cube([pcb_u1 - pcb_u0, pcb_v1 - pcb_v0, pcb_w1 - pcb_w0]);
    }
}

// Pi 5 + cooler envelope (clearance checking only): 85 x 56 board on the
// display's mounting holes, conservative in length.
module pi_model() {
    placed() translate([-62, pi_v0, -pi_depth])
        cube([124, 56.2, pi_depth - 7.02]);
}


// =====================================================================
// SNAP-ON RETAINING CLIPS (print separately, press on after the screen
// is seated). They hook onto the TOP-EDGE strip of the plate:
//   * a lip reaches over the top edge of the lens (black border only)
//   * a flexing finger runs down the back face of the strip and a
//     barb clicks in under it
// Profile is drawn in the panel's (v, w) plane and extruded along the
// length of the screen (clip_w). Printed standing on end so the layers
// run along the finger (strong, no delamination).
// =====================================================================
clip_w     = 14;      // clip width along the screen
clip_x     = [-130, -85, 85, 130];  // positions (keep clear of the PCB/HDMI, |x|<70)
clip_reach = 4.0;     // how far the lip reaches over the lens edge
clip_gap   = 0.45;    // lip bottom height above the lens face
clip_leg_t = 1.6;     // thickness of the lip / top leg
clip_f_root = 1.2;    // finger thickness at the root
clip_f_tip  = 0.8;    // finger thickness at the tip
clip_barb  = 0.7;     // barb protrusion (how far it deflects to snap on)
clip_fgap  = 0.2;     // clearance between finger and strip rear face

function clip_pts() =
    let(
        w_leg_b = w_top + 0.05,                // leg sits on the ridge top
        w_leg_t = w_leg_b + clip_leg_t,
        v_tip   = pk_v1 - clip_reach,          // lip tip (over the lens)
        v_fi    = v_hi + clip_fgap,            // finger inner face
        w_c     = w_bot - 0.10,                // barb catch face (under strip)
        w_ft    = w_c - 2.45                   // finger tip
    ) [
        [v_tip,               w_leg_b],
        [v_tip,               w_leg_t],
        [v_fi + clip_f_root,  w_leg_t],
        [v_fi + clip_f_tip,   w_ft],
        [v_fi,                w_ft],
        [v_fi,                w_c - 1.0 - 0.0],   // start of lead-in ramp
        [v_fi - clip_barb,    w_c - 0.30],        // barb tip (bottom)
        [v_fi - clip_barb,    w_c],               // barb tip (top)
        [v_fi,                w_c],               // catch face meets finger
        [v_fi,                w_leg_b]
    ];

// clip in the assembled position (panel frame -> world)
module clip_assembled(xc) {
    placed() translate([xc - clip_w/2, 0, 0])
        rotate([90, 0, 90]) linear_extrude(height = clip_w) polygon(clip_pts());
}

// clip for printing: profile flat on the bed, extruded UP
module clip_print() {
    linear_extrude(height = clip_w) polygon(clip_pts());
}

// ---------------------- EXPORT SELECTOR -------------------------------
// "stand"   full stand
// "test"    60 mm end section with a full cross-section, to test-fit a
//           corner of the real panel before committing to the big print
// "preview" stand + ghost panel for viewing
// "collide" stand intersected with the panel (should come out EMPTY)

PART = "preview";

if (PART == "stand") {
    stand();
} else if (PART == "bar") {
    bar_for_print();
} else if (PART == "test") {
    // 62 mm end section incl. one boss + socket
    intersection() {
        stand();
        translate([-cheek_out - 1, -50, -1]) cube([62, 200, 200]);
    }
} else if (PART == "bar_test") {
    // 30 mm length of bar end with its dovetail, to try in the end section
    translate([0, 0, -y_f])
        rotate([90, 0, 0])
            intersection() {
                bar();
                translate([-x_b - dt_depth - 2, y_f - 1, 0]) cube([32 + dt_depth, bar_d + 2, 40]);
            }
} else if (PART == "stand_lensdown") {
    // stand rotated so the lens face is on the bed (support-free print;
    // needs a bed of about 300 x 100 mm). Exact: the ridge top plane
    // (w = ridge_up) becomes z = 0.
    multmatrix([[-1, 0, 0, 0],
                [ 0, s, c, -(s*y0 + c*z0)],
                [ 0, c,-s, ridge_up - c*y0 + s*z0],
                [ 0, 0, 0, 1]]) stand();
} else if (PART == "clips") {
    // 2 x 2 print plate
    for (i = [0:3]) translate([(i % 2) * 22, floor(i / 2) * 22, 0]) clip_print();
} else if (PART == "clips_asm") {
    for (xc = clip_x) clip_assembled(xc);
} else if (PART == "panel") {
    panel_model(true);
} else if (PART == "pi") {
    pi_model();
} else if (PART == "none") {
    // nothing (lets other files `include` the modules)
} else if (PART == "collide") {
    intersection() { union() { stand(); bar(); } union() { panel_model(true); pi_model(); } }
} else if (PART == "clips_collide") {
    // clips vs. stand, bar, screen and Pi: should be EMPTY
    intersection() {
        union() { stand(); bar(); panel_model(true); pi_model(); }
        for (xc = clip_x) clip_assembled(xc);
    }
} else if (PART == "joint") {
    intersection() { stand(); bar(); }
} else {
    stand();
    color("orange") bar();
    %panel_model(true);
    %pi_model();
    color("seagreen") for (xc = clip_x) clip_assembled(xc);
}
